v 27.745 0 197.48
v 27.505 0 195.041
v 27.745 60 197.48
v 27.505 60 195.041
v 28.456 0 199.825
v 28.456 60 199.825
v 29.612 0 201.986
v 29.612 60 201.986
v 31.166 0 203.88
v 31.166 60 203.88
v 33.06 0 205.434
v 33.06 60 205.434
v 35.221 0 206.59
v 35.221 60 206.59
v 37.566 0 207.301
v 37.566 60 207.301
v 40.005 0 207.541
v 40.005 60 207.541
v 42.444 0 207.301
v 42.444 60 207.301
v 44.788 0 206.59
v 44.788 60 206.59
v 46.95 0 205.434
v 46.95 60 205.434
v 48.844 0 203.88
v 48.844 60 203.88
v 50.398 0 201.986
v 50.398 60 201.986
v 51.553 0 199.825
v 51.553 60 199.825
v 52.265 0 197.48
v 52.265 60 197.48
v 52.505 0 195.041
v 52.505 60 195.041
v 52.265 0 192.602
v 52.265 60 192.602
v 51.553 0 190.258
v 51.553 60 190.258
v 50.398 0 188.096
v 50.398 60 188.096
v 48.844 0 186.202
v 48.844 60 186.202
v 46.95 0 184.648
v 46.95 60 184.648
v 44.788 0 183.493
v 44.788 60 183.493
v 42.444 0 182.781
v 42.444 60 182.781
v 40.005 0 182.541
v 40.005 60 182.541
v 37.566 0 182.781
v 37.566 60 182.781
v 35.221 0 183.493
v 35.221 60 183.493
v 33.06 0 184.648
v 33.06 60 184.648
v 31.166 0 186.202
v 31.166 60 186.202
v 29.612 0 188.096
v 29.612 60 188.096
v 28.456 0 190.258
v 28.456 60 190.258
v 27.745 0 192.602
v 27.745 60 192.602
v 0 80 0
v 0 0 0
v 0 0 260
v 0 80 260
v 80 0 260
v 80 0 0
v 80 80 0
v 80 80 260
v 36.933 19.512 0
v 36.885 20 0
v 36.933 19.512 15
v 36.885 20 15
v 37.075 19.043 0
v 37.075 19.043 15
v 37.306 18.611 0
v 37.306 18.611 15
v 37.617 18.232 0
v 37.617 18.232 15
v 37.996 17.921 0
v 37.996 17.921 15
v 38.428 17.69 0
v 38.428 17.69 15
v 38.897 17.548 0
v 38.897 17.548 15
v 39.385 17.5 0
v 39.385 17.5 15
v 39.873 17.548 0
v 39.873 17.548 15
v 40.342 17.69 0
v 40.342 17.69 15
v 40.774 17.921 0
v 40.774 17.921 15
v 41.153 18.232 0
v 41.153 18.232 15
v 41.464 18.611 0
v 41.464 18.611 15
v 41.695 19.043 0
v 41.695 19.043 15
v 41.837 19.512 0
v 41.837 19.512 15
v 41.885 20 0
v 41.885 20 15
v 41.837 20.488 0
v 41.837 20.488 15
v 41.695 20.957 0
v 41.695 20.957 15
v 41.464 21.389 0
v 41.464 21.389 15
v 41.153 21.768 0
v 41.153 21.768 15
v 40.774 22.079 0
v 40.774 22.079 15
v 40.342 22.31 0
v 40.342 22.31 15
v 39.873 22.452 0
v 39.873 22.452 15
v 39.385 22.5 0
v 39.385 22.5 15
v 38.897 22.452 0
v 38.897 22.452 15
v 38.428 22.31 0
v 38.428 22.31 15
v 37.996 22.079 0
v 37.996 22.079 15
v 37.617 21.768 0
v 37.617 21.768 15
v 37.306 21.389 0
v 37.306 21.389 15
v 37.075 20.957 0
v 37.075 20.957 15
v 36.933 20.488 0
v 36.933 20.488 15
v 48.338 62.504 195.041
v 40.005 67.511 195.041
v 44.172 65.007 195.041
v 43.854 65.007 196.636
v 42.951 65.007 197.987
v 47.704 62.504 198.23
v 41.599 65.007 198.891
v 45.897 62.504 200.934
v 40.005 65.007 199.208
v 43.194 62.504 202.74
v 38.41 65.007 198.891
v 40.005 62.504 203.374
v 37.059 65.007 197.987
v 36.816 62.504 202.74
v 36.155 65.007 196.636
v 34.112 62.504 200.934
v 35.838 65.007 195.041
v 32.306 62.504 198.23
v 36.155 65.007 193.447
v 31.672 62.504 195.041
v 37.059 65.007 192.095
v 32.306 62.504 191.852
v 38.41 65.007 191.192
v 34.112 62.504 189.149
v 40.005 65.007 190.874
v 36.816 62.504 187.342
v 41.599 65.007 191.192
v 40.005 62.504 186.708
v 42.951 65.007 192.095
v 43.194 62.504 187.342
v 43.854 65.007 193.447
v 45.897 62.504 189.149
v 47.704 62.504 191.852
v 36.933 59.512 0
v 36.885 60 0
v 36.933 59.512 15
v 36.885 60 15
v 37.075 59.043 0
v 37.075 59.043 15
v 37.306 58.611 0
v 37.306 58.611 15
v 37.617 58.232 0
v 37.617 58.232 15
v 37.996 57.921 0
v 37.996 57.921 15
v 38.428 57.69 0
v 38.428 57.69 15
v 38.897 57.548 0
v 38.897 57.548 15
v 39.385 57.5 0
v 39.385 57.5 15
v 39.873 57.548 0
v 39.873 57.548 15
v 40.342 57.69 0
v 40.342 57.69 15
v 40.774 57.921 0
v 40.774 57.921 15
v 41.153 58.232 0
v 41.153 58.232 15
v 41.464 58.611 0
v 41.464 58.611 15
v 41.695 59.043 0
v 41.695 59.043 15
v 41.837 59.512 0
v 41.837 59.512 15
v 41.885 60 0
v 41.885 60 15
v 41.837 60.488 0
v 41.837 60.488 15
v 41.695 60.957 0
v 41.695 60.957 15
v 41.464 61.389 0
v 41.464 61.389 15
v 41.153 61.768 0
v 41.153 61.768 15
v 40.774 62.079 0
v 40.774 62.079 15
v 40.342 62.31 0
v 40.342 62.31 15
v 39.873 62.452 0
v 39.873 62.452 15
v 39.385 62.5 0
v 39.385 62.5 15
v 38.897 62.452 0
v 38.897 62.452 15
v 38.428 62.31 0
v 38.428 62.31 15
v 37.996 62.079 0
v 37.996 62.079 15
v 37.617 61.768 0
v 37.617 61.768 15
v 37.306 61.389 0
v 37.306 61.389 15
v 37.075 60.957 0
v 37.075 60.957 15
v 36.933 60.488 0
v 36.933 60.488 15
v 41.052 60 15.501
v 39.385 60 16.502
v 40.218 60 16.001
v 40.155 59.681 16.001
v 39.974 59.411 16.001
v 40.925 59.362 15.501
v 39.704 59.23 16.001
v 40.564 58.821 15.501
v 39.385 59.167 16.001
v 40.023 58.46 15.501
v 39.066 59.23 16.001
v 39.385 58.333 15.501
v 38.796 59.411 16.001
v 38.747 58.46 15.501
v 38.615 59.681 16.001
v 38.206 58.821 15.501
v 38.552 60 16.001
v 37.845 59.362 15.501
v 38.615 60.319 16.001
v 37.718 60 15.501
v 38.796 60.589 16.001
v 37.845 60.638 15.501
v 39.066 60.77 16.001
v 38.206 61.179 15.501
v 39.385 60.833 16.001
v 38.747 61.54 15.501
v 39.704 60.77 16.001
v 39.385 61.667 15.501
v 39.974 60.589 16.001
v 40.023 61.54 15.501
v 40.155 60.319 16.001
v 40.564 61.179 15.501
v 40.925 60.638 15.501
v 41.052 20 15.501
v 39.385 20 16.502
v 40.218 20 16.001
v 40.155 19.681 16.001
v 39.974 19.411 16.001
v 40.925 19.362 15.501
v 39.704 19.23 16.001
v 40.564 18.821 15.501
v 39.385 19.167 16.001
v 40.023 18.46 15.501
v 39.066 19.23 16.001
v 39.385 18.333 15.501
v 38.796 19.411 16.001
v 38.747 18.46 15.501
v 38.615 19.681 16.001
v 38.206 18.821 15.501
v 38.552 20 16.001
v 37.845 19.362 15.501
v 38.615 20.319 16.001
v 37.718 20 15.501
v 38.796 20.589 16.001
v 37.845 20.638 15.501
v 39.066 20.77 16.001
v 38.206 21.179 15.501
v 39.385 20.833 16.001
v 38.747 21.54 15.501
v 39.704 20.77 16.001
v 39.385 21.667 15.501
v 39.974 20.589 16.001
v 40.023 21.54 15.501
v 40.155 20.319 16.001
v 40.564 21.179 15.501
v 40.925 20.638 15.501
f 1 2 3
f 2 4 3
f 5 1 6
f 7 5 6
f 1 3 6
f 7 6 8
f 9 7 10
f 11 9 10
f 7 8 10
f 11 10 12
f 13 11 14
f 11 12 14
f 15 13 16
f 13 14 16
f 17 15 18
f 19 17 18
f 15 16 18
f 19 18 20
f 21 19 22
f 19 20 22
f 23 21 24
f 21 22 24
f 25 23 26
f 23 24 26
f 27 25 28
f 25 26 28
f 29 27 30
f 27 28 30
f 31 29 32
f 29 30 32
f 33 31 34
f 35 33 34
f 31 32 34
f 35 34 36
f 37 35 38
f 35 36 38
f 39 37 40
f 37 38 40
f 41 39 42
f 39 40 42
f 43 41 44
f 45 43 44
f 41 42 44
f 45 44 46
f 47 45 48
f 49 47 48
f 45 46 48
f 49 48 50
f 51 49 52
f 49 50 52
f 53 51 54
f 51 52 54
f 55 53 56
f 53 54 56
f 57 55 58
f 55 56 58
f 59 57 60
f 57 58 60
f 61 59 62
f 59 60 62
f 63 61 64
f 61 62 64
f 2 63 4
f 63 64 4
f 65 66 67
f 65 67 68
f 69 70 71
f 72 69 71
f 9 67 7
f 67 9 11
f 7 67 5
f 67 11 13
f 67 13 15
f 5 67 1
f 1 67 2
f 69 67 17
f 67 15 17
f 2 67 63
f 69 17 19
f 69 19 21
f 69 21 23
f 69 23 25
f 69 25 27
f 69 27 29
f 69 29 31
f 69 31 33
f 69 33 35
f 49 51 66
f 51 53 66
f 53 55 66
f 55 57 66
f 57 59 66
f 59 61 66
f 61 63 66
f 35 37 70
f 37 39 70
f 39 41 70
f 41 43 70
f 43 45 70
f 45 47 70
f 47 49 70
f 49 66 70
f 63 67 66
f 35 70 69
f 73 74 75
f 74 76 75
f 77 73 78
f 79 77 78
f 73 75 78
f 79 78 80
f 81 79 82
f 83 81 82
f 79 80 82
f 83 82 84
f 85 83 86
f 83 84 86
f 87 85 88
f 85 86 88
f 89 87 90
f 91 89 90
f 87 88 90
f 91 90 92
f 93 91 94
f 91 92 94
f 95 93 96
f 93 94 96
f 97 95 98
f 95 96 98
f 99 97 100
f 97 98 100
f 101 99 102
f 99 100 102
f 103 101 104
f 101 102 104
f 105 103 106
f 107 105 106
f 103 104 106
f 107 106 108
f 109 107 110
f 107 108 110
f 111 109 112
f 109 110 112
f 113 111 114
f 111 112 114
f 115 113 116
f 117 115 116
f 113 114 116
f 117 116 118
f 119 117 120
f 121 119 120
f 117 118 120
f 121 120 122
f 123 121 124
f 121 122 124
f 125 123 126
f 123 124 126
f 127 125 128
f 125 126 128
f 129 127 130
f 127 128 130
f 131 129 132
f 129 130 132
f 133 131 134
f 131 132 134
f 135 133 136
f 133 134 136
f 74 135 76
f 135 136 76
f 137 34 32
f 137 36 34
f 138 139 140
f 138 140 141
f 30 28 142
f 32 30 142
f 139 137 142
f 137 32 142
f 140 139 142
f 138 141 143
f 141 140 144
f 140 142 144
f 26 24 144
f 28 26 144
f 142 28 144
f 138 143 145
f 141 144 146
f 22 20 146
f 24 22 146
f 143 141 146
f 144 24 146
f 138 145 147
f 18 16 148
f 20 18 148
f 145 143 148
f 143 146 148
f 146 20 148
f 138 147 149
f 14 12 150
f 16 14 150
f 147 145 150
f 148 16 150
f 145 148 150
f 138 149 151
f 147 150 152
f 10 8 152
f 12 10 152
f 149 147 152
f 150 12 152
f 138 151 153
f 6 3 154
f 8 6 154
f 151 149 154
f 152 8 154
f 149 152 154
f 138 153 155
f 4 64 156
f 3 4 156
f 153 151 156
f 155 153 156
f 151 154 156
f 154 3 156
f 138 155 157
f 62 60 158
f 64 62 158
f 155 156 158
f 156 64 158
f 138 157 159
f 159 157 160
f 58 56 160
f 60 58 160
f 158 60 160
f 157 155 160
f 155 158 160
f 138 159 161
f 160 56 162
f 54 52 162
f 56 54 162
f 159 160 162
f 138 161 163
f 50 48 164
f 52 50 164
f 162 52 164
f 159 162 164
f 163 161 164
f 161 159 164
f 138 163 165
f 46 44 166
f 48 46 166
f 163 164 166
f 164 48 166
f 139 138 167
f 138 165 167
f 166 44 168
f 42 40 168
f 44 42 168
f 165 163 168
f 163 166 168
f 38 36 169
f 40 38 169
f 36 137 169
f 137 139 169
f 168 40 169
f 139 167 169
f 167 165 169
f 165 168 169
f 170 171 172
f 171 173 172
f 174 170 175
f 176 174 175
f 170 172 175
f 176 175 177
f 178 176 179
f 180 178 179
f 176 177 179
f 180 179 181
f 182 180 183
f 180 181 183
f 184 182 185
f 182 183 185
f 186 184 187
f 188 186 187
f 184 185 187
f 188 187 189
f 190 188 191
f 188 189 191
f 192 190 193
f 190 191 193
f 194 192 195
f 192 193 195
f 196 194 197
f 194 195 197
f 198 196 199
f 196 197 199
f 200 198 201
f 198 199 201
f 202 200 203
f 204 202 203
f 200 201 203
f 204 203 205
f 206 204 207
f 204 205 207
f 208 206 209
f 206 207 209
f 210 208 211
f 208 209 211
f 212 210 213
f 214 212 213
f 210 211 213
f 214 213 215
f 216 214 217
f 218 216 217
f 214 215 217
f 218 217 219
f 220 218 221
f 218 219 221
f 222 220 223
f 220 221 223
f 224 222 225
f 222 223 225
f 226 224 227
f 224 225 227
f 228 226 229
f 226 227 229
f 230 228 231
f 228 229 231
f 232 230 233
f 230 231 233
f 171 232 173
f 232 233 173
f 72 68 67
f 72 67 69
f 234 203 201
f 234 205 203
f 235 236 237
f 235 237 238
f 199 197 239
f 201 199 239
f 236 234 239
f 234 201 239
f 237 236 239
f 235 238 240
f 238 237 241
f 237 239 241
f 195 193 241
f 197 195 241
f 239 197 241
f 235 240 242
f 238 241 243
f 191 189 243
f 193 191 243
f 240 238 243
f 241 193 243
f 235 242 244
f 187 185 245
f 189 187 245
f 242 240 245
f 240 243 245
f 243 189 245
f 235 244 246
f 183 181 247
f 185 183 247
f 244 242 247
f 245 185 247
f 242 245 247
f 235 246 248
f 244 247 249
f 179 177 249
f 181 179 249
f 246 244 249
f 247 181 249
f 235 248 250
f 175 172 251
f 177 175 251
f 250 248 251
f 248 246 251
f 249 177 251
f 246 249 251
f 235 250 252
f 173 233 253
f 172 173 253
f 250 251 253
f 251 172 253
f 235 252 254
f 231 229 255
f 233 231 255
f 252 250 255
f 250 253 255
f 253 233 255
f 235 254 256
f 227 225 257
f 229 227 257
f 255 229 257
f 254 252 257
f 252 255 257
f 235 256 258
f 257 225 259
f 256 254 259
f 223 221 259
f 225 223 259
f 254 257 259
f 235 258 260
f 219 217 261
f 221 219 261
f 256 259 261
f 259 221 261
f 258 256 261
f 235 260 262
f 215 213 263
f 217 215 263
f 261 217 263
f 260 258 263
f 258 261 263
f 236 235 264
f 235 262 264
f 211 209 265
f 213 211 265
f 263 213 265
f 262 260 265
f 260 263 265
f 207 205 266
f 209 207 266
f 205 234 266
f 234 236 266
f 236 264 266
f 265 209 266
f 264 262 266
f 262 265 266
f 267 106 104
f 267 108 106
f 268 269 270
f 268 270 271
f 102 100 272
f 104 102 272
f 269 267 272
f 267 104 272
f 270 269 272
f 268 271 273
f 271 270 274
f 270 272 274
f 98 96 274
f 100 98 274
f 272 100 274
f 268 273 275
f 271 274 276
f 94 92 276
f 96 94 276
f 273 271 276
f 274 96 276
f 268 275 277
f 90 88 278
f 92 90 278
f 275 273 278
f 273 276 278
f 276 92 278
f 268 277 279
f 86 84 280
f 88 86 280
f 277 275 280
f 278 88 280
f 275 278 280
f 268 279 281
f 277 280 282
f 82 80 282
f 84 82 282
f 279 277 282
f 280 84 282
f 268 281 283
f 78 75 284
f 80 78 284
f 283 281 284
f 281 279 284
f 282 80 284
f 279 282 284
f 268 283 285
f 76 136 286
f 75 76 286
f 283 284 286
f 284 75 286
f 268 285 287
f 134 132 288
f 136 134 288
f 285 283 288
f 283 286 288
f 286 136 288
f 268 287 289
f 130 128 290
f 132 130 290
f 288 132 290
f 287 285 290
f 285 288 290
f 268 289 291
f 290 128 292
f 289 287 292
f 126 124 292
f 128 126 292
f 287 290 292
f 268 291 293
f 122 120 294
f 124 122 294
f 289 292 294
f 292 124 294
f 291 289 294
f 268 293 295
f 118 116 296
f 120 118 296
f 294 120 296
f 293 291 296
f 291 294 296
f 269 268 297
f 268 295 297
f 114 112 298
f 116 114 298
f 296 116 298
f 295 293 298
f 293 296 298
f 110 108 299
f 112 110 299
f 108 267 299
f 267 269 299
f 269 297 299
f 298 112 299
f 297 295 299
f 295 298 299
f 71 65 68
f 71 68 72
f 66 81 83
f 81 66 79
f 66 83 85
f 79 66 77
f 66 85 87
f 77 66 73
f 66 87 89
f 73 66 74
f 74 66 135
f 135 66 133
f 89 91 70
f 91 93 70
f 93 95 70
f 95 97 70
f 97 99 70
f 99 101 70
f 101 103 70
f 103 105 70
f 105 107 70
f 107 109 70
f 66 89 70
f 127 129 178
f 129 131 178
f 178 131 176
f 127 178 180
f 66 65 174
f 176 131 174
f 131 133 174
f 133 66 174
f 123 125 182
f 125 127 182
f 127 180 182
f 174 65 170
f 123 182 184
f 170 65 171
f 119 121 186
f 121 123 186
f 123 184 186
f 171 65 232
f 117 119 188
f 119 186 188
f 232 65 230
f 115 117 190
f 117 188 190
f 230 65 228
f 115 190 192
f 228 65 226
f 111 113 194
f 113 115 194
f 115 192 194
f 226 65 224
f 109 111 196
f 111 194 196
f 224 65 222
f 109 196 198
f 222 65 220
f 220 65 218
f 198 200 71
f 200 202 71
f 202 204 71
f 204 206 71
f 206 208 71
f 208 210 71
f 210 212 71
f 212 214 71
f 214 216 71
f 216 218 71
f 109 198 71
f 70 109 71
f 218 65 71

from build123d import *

# Parameters (mm, degrees)
F0_W     = 80
F0_H     = 80
F1_DEPTH = 260
F3_D     = 25
F3_DEPTH = 60
F3_TIP   = 7.5107577378
F5_D     = 5
F5_DEPTH = 15
F5_TIP   = 1.5021515476


with BuildPart() as f1:
    # F0 (on Top) → F1 (new body)
    with BuildSketch(Plane.XY):
        with Locations((40, 40)):
            Rectangle(F0_W, F0_H)
    extrude(amount=F1_DEPTH)

    # F3
    with Locations(Plane.XZ):
        with Locations((40.004914752, 195.0411053359)):
            Hole(F3_D / 2, depth=F3_DEPTH)
            with Locations((0, 0, -(F3_DEPTH + F3_TIP / 2))):  # 118° drill point
                Cone(0, F3_D / 2, F3_TIP, mode=Mode.SUBTRACT)

    # F5
    with Locations(Plane(origin=(0, 0, 0), x_dir=(1, 0, 0), z_dir=(0, 0, -1))):
        with Locations((39.3849909306, -20), (39.3849909306, -60)):
            Hole(F5_D / 2, depth=F5_DEPTH)
            with Locations((0, 0, -(F5_DEPTH + F5_TIP / 2))):  # 118° drill point
                Cone(0, F5_D / 2, F5_TIP, mode=Mode.SUBTRACT)


solid = f1.part
